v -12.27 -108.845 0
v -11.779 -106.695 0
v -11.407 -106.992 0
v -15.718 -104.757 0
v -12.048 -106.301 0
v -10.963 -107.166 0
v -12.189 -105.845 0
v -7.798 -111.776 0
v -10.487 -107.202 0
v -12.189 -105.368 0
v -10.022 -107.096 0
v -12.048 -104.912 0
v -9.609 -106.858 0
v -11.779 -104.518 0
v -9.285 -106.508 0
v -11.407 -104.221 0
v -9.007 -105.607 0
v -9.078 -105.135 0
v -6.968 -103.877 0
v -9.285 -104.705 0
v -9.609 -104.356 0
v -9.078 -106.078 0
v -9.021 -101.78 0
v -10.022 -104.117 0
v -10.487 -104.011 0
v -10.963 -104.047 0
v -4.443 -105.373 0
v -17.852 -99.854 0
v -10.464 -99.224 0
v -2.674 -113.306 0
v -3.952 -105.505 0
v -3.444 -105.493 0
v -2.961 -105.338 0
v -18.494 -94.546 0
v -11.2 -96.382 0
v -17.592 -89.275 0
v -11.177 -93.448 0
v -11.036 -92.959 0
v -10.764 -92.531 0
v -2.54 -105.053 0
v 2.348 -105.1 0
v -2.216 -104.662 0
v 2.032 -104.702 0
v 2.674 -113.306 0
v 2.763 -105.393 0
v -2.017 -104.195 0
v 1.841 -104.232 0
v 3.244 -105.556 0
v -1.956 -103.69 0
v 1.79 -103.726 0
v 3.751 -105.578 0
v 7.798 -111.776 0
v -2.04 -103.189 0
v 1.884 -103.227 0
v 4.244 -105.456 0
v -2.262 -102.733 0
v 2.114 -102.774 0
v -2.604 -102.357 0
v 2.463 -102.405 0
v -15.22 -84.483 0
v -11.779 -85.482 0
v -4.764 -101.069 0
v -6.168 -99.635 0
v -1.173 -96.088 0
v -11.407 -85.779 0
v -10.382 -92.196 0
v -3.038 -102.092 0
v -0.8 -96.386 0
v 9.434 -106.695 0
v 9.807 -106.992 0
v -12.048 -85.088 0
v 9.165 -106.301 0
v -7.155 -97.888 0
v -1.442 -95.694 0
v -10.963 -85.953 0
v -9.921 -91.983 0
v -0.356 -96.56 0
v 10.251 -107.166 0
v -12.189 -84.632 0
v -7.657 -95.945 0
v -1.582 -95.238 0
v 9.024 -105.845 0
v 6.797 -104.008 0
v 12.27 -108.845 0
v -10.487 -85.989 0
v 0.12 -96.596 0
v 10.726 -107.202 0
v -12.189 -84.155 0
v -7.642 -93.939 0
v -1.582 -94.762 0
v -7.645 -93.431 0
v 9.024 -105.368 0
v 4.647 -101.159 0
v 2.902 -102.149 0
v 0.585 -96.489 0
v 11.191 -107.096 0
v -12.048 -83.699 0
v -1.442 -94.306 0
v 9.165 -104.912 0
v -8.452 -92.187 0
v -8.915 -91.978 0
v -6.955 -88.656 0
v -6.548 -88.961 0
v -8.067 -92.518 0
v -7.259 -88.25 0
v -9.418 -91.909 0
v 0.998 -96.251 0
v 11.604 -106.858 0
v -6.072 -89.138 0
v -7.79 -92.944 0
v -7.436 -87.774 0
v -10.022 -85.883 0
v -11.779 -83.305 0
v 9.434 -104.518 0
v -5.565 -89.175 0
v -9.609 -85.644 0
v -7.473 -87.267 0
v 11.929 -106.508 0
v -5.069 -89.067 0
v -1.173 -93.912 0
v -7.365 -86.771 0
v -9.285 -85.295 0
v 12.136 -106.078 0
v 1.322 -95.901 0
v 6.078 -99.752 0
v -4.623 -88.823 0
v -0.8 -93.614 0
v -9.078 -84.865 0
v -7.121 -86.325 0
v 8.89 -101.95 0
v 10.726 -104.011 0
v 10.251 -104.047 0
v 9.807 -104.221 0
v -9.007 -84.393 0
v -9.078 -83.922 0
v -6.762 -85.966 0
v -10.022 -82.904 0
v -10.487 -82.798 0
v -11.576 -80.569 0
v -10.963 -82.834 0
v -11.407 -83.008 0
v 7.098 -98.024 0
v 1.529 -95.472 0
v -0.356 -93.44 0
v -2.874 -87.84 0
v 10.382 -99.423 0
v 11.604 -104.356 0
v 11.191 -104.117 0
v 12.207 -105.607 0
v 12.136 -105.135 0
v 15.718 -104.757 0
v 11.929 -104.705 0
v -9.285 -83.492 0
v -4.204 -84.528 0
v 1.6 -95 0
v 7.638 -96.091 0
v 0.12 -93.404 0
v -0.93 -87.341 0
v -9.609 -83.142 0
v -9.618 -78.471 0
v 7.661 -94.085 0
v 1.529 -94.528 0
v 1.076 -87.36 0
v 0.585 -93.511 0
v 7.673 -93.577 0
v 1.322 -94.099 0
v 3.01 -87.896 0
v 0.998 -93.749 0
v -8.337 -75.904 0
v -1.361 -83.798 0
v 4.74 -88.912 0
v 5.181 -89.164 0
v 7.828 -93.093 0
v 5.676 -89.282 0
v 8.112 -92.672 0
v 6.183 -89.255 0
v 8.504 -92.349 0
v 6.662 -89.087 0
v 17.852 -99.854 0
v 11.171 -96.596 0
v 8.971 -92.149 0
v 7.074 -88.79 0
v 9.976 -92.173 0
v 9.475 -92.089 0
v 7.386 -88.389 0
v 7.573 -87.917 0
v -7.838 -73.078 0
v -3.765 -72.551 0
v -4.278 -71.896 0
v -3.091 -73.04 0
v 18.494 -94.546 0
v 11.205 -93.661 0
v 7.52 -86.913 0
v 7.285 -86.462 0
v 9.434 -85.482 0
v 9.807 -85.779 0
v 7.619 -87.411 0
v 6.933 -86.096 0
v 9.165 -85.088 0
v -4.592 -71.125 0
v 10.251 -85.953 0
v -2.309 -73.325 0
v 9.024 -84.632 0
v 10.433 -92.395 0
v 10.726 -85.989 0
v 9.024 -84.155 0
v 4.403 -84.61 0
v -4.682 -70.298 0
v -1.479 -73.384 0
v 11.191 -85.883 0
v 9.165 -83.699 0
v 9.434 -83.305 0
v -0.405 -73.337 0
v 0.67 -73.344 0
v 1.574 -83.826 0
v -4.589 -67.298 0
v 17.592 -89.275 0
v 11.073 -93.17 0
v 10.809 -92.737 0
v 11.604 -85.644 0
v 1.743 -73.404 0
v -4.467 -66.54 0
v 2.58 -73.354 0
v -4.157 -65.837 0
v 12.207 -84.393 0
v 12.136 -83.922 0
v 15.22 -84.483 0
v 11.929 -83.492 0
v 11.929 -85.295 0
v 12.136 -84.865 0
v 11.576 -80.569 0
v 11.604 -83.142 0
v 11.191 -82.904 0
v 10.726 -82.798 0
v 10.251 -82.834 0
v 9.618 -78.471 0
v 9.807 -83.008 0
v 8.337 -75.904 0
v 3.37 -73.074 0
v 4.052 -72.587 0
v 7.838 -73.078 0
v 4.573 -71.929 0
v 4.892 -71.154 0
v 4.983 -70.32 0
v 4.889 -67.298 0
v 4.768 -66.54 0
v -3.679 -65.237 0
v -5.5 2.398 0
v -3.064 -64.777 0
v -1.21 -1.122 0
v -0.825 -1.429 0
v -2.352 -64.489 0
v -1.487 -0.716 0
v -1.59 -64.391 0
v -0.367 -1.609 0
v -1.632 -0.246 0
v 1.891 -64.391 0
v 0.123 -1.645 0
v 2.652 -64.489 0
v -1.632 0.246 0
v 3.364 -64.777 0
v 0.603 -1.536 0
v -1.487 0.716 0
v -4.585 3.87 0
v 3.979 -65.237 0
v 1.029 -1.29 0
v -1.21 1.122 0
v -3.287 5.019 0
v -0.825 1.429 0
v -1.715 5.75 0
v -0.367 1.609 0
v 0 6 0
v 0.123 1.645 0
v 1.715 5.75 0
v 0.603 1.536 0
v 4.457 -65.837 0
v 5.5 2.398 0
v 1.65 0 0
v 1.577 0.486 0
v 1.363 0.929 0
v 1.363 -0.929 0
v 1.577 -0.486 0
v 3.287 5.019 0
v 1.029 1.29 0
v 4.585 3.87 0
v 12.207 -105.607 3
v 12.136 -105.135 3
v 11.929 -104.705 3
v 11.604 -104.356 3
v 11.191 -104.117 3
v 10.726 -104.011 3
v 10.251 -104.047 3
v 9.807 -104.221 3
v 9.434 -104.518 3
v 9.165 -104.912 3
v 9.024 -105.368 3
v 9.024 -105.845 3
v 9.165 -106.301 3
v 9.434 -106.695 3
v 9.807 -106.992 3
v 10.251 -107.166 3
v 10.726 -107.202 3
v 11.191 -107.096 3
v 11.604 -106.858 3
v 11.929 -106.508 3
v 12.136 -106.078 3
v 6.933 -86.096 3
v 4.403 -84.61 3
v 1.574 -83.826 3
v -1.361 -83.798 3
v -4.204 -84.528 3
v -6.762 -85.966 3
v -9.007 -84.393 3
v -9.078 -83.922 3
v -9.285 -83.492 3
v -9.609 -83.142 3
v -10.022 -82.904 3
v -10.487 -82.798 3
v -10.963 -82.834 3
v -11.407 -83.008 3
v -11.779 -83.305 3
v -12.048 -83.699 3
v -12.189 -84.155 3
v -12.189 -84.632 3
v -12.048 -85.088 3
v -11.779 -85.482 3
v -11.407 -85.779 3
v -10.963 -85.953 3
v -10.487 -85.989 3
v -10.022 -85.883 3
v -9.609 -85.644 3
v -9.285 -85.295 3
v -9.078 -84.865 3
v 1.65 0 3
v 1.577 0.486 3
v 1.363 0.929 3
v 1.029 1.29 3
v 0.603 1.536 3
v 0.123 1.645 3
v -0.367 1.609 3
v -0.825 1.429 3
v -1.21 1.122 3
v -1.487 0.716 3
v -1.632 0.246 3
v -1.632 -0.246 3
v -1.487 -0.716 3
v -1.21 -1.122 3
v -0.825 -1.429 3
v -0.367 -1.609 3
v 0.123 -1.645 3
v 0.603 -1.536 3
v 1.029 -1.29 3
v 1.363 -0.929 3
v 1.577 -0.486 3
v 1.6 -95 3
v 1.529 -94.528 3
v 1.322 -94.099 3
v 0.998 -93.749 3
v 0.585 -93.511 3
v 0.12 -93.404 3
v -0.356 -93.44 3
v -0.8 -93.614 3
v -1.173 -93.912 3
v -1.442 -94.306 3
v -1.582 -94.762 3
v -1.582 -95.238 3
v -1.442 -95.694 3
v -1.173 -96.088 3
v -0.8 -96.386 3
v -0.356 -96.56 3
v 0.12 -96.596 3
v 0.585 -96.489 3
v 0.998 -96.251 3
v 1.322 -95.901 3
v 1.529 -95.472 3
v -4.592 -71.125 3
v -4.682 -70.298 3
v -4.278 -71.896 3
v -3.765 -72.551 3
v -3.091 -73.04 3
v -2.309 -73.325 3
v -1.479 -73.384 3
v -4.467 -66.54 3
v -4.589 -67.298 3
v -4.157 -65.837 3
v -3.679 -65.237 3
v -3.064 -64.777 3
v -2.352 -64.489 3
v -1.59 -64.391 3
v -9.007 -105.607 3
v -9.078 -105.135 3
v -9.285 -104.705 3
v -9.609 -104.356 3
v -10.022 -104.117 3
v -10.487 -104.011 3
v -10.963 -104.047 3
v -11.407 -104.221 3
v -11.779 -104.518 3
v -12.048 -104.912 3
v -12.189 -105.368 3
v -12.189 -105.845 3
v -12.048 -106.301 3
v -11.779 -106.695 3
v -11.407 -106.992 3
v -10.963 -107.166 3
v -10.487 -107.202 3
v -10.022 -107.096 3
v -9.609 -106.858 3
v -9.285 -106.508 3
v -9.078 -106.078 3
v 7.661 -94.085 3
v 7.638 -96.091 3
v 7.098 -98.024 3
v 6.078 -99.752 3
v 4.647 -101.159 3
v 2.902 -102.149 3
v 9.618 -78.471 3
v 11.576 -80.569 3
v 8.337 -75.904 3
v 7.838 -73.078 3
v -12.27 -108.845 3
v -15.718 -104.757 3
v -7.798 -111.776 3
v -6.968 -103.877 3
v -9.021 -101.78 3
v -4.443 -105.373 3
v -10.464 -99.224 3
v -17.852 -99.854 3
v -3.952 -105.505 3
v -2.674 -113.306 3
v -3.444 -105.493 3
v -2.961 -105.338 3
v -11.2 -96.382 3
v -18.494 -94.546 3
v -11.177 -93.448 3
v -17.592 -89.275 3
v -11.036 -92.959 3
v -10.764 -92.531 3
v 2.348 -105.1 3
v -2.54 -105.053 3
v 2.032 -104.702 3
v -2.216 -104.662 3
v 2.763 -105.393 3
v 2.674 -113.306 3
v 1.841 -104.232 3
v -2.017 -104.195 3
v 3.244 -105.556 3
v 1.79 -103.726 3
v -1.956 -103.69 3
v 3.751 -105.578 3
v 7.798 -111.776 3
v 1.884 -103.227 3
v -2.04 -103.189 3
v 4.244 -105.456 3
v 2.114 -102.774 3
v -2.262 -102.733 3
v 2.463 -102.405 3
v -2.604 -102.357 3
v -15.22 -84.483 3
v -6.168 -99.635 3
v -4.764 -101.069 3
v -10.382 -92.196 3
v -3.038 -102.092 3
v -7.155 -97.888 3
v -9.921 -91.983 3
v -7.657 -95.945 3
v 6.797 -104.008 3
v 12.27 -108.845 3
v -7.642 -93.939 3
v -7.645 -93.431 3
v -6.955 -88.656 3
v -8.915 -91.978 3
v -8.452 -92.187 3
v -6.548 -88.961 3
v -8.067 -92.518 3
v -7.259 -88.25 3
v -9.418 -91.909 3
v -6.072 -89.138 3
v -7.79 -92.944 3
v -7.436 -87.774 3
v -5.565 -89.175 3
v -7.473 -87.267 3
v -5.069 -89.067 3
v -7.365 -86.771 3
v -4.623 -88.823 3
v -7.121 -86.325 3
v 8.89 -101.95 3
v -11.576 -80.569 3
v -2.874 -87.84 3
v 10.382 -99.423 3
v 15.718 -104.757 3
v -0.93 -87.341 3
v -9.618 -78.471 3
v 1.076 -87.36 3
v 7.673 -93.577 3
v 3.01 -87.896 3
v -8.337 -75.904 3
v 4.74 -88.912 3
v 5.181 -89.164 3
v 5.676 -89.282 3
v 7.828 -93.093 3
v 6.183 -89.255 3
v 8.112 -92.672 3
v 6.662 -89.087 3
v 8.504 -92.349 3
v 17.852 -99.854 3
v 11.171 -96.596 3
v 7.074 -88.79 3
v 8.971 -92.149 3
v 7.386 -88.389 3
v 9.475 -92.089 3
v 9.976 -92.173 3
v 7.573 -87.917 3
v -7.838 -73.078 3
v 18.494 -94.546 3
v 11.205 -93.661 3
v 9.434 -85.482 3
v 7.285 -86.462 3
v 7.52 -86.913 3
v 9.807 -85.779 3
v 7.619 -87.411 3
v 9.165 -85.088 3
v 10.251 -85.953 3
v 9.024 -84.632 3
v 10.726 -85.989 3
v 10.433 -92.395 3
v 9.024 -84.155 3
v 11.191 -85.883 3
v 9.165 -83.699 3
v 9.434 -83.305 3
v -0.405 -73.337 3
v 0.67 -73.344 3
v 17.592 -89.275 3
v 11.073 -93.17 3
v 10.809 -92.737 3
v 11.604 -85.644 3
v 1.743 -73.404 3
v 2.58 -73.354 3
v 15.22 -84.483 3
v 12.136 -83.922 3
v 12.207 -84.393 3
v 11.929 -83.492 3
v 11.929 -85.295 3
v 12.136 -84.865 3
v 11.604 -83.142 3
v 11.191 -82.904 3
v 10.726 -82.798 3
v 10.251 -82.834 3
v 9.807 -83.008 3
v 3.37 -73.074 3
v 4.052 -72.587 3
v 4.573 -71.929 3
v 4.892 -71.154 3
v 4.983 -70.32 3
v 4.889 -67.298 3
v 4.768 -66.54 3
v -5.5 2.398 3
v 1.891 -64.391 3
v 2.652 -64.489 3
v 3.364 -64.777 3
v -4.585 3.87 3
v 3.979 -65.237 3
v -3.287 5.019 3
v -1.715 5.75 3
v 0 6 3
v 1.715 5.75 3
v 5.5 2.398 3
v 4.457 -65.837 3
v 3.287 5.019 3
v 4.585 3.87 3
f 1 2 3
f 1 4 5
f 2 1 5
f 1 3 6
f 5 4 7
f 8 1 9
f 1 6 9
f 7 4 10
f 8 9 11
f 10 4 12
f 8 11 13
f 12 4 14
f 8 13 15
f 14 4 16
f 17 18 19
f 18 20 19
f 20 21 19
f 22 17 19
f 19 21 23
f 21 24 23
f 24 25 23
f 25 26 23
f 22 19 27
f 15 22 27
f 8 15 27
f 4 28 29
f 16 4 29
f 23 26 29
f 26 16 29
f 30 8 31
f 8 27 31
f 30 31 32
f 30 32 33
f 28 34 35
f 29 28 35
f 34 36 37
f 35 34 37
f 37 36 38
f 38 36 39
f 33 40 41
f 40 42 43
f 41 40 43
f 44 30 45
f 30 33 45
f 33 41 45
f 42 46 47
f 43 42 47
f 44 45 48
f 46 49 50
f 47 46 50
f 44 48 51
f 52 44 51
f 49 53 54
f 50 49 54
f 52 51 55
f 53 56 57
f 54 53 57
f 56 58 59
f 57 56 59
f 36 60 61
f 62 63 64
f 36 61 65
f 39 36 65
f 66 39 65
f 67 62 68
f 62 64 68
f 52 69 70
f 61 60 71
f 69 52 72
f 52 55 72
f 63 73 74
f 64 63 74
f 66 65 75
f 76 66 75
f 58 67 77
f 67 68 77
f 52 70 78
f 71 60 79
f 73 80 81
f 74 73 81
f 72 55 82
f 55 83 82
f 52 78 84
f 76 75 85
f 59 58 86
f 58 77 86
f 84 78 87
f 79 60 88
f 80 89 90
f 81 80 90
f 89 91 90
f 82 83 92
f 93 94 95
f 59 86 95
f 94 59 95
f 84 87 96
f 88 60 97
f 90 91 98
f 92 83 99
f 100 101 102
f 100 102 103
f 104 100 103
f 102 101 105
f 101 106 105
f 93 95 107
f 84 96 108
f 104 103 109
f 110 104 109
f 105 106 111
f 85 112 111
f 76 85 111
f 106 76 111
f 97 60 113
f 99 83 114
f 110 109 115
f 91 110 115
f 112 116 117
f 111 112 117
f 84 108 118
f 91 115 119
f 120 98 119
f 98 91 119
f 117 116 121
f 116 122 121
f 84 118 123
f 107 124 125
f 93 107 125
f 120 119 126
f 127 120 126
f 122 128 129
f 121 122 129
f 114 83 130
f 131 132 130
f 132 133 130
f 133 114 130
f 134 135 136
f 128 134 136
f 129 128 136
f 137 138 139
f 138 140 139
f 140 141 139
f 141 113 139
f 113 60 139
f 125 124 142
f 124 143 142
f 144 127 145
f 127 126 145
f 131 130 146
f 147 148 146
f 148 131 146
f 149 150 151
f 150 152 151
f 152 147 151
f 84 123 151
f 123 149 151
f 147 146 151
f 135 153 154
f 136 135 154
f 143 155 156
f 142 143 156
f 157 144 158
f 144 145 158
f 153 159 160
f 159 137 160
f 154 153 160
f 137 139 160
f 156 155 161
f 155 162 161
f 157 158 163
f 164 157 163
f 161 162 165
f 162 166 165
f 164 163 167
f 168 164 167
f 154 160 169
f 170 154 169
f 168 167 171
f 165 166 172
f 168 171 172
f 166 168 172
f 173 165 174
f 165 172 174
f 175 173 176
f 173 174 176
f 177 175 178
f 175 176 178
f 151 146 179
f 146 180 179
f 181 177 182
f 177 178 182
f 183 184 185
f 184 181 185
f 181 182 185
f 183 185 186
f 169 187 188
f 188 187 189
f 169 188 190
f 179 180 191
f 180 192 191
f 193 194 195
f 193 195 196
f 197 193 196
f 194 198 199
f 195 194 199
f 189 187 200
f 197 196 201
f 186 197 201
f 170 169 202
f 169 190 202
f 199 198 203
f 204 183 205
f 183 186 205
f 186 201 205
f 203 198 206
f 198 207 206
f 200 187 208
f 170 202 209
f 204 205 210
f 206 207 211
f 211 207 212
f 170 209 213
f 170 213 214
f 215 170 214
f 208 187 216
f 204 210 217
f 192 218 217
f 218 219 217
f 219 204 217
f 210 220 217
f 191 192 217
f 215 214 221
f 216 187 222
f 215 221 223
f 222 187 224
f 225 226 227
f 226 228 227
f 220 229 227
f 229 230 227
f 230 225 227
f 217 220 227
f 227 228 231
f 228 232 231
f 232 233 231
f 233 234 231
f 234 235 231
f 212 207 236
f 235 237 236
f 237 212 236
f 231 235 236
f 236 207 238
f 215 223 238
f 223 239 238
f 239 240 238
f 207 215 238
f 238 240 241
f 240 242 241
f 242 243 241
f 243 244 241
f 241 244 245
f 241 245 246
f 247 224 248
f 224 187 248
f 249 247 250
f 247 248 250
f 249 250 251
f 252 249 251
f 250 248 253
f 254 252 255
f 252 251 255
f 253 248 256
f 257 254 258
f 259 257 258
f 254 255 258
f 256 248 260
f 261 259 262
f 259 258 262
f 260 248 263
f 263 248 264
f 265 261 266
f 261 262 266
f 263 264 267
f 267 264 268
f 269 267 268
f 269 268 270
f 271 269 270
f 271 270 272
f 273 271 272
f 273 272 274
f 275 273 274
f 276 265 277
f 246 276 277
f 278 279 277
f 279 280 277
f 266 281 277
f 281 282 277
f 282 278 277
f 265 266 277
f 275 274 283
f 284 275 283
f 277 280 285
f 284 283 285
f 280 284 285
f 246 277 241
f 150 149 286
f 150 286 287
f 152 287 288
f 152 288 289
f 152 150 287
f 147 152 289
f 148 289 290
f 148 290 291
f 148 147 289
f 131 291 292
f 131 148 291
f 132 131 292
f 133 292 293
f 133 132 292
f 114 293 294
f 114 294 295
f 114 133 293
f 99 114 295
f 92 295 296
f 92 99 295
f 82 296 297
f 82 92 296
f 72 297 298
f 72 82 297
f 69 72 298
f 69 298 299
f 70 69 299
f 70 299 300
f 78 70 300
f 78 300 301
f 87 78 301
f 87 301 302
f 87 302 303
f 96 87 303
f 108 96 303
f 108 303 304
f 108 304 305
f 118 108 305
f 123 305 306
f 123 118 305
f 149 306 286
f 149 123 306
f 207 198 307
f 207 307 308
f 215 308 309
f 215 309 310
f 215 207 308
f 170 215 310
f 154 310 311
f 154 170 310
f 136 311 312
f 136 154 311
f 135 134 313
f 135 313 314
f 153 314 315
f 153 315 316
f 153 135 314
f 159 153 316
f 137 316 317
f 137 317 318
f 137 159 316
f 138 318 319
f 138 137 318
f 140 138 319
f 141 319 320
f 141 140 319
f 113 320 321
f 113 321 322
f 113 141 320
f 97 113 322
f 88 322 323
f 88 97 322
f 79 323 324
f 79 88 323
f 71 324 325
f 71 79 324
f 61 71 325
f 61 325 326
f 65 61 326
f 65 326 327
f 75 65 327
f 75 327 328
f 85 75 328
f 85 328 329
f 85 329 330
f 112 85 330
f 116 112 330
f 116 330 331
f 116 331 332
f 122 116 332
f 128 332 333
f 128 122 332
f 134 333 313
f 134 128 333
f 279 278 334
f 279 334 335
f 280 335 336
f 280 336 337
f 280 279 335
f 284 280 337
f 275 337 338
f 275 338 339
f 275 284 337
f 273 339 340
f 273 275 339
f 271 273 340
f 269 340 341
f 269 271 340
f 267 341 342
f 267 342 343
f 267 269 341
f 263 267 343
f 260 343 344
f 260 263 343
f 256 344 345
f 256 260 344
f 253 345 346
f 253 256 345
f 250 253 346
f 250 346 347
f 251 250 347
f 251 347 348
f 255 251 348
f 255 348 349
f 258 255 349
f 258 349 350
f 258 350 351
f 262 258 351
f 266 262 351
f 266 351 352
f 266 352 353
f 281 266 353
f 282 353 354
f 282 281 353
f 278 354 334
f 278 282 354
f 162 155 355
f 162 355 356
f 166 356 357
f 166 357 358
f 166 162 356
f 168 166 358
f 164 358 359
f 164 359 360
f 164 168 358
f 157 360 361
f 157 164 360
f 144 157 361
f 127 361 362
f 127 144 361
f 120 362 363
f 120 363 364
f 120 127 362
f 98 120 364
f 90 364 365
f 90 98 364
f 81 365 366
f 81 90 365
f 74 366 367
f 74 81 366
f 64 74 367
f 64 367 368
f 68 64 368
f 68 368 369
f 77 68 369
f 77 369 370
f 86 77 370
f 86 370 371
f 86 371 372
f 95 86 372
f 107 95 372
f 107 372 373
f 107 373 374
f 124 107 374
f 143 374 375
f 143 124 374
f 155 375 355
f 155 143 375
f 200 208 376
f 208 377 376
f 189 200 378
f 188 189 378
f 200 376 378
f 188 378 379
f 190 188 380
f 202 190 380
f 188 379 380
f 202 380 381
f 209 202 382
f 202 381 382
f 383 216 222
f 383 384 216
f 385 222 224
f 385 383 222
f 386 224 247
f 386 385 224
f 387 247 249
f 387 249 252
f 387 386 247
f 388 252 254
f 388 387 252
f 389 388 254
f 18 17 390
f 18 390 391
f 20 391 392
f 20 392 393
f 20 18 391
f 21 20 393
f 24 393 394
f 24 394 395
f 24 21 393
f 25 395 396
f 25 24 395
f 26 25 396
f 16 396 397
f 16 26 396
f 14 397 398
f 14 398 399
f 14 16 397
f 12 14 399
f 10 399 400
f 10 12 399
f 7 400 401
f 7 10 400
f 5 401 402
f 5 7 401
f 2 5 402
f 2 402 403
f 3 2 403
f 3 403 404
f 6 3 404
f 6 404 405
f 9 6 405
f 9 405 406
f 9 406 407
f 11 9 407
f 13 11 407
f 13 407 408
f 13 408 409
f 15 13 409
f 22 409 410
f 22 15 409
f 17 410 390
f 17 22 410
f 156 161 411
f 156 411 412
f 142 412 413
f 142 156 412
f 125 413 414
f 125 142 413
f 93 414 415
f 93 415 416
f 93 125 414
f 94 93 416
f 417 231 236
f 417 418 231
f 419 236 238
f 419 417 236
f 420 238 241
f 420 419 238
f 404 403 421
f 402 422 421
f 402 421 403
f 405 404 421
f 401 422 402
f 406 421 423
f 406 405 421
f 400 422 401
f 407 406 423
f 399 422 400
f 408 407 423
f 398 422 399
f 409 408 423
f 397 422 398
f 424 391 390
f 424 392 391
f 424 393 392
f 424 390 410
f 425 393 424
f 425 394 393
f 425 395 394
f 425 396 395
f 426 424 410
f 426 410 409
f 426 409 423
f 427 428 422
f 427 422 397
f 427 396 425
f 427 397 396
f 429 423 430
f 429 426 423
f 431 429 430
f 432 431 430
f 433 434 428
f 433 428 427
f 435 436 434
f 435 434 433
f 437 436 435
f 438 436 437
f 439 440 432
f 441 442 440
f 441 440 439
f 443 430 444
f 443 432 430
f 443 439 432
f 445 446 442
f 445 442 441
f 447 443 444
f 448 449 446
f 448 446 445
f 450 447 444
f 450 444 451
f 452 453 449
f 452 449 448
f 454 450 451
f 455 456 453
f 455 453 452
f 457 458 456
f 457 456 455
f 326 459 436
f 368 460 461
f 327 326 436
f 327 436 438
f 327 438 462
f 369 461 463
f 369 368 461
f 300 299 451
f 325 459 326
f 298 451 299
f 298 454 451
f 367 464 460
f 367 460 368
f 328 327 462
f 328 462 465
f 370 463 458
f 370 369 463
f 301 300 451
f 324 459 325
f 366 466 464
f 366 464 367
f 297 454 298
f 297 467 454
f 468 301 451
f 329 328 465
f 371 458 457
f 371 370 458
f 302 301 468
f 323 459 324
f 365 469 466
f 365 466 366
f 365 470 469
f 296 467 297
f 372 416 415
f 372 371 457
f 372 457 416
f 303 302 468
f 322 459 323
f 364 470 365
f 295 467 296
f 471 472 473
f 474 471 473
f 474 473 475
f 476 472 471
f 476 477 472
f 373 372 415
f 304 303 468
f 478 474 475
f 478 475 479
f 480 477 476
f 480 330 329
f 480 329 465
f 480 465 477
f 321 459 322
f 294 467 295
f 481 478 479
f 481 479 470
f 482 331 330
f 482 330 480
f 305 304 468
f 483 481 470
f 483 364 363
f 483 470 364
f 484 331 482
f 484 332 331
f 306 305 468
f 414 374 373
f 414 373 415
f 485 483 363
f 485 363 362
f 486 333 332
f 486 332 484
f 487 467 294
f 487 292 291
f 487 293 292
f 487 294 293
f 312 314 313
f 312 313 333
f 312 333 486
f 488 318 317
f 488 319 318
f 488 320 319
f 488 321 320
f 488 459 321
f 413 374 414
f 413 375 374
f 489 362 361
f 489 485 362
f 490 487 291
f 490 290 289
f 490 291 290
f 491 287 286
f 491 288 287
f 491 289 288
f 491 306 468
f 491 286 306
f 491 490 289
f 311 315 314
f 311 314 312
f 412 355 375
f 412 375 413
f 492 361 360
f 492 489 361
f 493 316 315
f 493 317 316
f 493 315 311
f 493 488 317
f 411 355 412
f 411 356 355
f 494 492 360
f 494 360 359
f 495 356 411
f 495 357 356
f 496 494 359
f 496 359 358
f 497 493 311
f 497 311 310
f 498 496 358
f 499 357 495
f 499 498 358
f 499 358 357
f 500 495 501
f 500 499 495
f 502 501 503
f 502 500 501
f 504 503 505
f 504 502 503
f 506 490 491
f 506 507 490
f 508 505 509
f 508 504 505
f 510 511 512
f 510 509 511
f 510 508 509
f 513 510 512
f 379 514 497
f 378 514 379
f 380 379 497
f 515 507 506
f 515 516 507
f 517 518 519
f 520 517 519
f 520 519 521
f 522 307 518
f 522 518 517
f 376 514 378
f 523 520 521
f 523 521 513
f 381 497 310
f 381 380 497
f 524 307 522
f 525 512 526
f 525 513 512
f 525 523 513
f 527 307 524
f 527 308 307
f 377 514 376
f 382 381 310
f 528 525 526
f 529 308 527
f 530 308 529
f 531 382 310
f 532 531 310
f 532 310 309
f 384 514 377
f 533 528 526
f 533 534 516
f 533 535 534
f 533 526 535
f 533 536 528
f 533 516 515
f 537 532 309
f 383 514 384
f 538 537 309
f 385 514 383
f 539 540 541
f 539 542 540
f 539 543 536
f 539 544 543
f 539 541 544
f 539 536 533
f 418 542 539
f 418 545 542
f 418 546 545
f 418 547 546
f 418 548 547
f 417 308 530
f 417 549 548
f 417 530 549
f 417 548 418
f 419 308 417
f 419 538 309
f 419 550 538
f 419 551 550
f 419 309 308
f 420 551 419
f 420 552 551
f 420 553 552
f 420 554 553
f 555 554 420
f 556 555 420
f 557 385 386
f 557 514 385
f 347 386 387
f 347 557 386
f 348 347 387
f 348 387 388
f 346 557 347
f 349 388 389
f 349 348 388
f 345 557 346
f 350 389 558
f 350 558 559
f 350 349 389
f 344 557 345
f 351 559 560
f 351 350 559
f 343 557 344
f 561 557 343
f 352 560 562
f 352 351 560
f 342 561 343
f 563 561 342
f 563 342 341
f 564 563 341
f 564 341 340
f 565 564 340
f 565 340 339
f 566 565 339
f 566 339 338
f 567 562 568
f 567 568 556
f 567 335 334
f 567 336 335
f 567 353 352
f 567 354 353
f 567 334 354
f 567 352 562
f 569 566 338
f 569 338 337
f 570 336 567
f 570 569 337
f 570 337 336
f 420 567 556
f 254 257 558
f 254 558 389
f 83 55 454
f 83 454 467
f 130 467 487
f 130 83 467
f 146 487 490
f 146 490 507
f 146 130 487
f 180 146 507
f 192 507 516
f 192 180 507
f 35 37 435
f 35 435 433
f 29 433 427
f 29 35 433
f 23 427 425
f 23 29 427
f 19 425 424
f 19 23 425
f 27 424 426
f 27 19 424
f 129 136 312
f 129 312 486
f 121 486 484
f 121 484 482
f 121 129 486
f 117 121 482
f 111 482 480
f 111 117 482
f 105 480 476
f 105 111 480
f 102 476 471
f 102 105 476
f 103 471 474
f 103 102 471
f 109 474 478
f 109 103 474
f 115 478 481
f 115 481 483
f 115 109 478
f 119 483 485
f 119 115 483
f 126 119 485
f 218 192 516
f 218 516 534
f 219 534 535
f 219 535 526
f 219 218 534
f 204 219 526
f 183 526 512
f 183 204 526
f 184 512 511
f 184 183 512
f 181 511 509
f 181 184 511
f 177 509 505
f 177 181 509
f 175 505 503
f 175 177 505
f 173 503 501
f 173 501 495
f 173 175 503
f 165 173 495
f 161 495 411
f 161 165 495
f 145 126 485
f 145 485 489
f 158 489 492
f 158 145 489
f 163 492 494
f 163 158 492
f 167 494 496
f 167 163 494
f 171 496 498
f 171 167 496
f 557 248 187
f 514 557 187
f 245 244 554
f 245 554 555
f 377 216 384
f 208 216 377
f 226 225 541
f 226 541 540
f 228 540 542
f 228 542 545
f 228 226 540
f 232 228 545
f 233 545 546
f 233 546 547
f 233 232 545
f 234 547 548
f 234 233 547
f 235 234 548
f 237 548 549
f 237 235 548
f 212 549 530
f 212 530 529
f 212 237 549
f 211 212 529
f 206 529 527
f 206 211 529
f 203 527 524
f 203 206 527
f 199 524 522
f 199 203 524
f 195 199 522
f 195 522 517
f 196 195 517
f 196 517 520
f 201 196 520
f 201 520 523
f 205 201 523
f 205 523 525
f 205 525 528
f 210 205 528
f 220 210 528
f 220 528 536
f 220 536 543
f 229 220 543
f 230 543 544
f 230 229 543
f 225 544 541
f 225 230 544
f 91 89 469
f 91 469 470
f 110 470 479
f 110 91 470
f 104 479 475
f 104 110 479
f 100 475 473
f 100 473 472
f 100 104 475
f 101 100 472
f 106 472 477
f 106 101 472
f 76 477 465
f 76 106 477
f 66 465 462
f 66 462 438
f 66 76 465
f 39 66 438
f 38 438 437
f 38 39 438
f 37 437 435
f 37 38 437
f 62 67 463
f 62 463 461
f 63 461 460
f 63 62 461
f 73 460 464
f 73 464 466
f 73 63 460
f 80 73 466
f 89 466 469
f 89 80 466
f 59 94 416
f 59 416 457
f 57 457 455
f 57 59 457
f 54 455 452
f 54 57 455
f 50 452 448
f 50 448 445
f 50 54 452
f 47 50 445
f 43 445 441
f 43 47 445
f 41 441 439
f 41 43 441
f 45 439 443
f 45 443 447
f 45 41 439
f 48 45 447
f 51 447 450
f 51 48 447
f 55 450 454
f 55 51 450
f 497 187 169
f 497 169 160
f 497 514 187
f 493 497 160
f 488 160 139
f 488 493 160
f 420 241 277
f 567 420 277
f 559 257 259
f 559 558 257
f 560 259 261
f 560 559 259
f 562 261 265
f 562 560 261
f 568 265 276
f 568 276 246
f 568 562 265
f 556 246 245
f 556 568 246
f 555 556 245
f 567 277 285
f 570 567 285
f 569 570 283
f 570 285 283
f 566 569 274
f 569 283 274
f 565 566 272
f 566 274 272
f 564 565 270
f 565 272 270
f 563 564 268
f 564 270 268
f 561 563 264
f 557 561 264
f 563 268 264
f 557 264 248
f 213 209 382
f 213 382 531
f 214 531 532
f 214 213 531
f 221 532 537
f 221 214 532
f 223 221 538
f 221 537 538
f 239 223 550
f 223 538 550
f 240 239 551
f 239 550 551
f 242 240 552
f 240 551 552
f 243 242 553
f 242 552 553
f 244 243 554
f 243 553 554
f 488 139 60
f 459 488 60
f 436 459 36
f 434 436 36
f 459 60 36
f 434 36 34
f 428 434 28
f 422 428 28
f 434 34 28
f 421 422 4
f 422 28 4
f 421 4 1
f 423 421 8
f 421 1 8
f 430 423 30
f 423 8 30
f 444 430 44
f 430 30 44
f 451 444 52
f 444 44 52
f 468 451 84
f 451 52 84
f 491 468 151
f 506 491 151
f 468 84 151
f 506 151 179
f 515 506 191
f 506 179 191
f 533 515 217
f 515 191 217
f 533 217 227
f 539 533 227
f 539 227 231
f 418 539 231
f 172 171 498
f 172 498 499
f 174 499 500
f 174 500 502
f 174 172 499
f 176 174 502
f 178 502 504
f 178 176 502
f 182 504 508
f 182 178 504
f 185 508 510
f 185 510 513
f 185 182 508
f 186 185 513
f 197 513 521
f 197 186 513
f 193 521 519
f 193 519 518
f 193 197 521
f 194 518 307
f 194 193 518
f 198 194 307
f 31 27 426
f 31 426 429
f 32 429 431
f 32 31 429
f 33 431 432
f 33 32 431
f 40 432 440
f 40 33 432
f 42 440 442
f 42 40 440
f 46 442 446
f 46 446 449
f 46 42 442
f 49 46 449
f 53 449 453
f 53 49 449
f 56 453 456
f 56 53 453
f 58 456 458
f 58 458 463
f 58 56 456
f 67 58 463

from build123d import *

# Parameters (mm, degrees)
SKETCH_1_R      = 1.65
SKETCH_1_R_2    = 1.6
EXTRUDE_1_DEPTH = 3
FILLET_2_R      = 10
FILLET_3_R      = 3


with BuildPart() as part:
    # 草图1 → 凸台-拉伸1 (new body)
    with BuildSketch(Plane.XY):
        with BuildLine():
            Line((-5.5, 2.397915762), (-8, -78.319172682))
            ThreePointArc((-8, -78.319172682), (0, -113.5), (8, -78.319172682))
            Line((8, -78.319172682), (5.5, 2.397915762))
            ThreePointArc((5.5, 2.397915762), (0, 6), (-5.5, 2.397915762))
        make_face()
        Circle(SKETCH_1_R, mode=Mode.SUBTRACT)
        with Locations((0, -95)):
            Circle(SKETCH_1_R_2, mode=Mode.SUBTRACT)
        with Locations((10.606601718, -84.393398282)):
            Circle(SKETCH_1_R_2, mode=Mode.SUBTRACT)
        with Locations((10.606601718, -105.606601718)):
            Circle(SKETCH_1_R_2, mode=Mode.SUBTRACT)
        with Locations((-10.606601718, -105.606601718)):
            Circle(SKETCH_1_R_2, mode=Mode.SUBTRACT)
        with Locations((-10.606601718, -84.393398282)):
            Circle(SKETCH_1_R_2, mode=Mode.SUBTRACT)
        with BuildLine():
            Line((-4.498993554, -64.390563515), (-4.79259564, -73.870045737))
            ThreePointArc((-4.79259564, -73.870045737), (0.155319711, -73.333901691), (5.095039914, -73.940928121))
            Line((5.095039914, -73.940928121), (4.799242432, -64.390563515))
            Line((4.799242432, -64.390563515), (-4.498993554, -64.390563515))
        make_face(mode=Mode.SUBTRACT)
        with BuildLine():
            ThreePointArc((6.933102995, -86.096444908), (0.107633433, -83.715957043), (-6.762002909, -85.965813425))
            ThreePointArc((-6.762002909, -85.965813425), (-7.121329366, -88.463845995), (-4.623296795, -88.823172453))
            ThreePointArc((-4.623296795, -88.823172453), (0.073590815, -87.284907246), (4.740280844, -88.912487427))
            ThreePointArc((4.740280844, -88.912487427), (7.244713179, -88.600877243), (6.933102995, -86.096444908))
        make_face(mode=Mode.SUBTRACT)
        with BuildLine():
            ThreePointArc((4.244153397, -105.456020867), (9.718451142, -100.735234766), (11.204836531, -93.661026988))
            ThreePointArc((11.204836531, -93.661026988), (9.221140094, -92.100824863), (7.660937969, -94.0845213))
            ThreePointArc((7.660937969, -94.0845213), (6.64467091, -98.921277892), (2.901800112, -102.148959919))
            ThreePointArc((2.901800112, -102.148959919), (1.91944628, -104.473667035), (4.244153397, -105.456020867))
        make_face(mode=Mode.SUBTRACT)
        with BuildLine():
            ThreePointArc((-11.177256391, -93.447534226), (-9.826084575, -100.548808191), (-4.442833622, -105.373159587))
            ThreePointArc((-4.442833622, -105.373159587), (-2.099810728, -104.435329142), (-3.037641173, -102.092306248))
            ThreePointArc((-3.037641173, -102.092306248), (-6.718261725, -98.793814861), (-7.642080956, -93.938552654))
            ThreePointArc((-7.642080956, -93.938552654), (-9.164159459, -91.925455722), (-11.177256391, -93.447534226))
        make_face(mode=Mode.SUBTRACT)
    extrude(amount=EXTRUDE_1_DEPTH)

    # 圆角2
    fillet_2_edges = [part.edges().sort_by_distance(p)[0] for p in [
        (8, -78.319172682, 1.5),
        (-8, -78.319172682, 1.5),
    ]]
    fillet(fillet_2_edges, radius=FILLET_2_R)

    # 圆角3
    fillet_3_edges = [part.edges().sort_by_distance(p)[0] for p in [
        (-4.79259564, -73.870045737, 1.5),
        (5.095039914, -73.940928121, 1.5),
        (4.799242432, -64.390563515, 1.5),
        (-4.498993554, -64.390563515, 1.5),
    ]]
    fillet(fillet_3_edges, radius=FILLET_3_R)


solid = part.part
